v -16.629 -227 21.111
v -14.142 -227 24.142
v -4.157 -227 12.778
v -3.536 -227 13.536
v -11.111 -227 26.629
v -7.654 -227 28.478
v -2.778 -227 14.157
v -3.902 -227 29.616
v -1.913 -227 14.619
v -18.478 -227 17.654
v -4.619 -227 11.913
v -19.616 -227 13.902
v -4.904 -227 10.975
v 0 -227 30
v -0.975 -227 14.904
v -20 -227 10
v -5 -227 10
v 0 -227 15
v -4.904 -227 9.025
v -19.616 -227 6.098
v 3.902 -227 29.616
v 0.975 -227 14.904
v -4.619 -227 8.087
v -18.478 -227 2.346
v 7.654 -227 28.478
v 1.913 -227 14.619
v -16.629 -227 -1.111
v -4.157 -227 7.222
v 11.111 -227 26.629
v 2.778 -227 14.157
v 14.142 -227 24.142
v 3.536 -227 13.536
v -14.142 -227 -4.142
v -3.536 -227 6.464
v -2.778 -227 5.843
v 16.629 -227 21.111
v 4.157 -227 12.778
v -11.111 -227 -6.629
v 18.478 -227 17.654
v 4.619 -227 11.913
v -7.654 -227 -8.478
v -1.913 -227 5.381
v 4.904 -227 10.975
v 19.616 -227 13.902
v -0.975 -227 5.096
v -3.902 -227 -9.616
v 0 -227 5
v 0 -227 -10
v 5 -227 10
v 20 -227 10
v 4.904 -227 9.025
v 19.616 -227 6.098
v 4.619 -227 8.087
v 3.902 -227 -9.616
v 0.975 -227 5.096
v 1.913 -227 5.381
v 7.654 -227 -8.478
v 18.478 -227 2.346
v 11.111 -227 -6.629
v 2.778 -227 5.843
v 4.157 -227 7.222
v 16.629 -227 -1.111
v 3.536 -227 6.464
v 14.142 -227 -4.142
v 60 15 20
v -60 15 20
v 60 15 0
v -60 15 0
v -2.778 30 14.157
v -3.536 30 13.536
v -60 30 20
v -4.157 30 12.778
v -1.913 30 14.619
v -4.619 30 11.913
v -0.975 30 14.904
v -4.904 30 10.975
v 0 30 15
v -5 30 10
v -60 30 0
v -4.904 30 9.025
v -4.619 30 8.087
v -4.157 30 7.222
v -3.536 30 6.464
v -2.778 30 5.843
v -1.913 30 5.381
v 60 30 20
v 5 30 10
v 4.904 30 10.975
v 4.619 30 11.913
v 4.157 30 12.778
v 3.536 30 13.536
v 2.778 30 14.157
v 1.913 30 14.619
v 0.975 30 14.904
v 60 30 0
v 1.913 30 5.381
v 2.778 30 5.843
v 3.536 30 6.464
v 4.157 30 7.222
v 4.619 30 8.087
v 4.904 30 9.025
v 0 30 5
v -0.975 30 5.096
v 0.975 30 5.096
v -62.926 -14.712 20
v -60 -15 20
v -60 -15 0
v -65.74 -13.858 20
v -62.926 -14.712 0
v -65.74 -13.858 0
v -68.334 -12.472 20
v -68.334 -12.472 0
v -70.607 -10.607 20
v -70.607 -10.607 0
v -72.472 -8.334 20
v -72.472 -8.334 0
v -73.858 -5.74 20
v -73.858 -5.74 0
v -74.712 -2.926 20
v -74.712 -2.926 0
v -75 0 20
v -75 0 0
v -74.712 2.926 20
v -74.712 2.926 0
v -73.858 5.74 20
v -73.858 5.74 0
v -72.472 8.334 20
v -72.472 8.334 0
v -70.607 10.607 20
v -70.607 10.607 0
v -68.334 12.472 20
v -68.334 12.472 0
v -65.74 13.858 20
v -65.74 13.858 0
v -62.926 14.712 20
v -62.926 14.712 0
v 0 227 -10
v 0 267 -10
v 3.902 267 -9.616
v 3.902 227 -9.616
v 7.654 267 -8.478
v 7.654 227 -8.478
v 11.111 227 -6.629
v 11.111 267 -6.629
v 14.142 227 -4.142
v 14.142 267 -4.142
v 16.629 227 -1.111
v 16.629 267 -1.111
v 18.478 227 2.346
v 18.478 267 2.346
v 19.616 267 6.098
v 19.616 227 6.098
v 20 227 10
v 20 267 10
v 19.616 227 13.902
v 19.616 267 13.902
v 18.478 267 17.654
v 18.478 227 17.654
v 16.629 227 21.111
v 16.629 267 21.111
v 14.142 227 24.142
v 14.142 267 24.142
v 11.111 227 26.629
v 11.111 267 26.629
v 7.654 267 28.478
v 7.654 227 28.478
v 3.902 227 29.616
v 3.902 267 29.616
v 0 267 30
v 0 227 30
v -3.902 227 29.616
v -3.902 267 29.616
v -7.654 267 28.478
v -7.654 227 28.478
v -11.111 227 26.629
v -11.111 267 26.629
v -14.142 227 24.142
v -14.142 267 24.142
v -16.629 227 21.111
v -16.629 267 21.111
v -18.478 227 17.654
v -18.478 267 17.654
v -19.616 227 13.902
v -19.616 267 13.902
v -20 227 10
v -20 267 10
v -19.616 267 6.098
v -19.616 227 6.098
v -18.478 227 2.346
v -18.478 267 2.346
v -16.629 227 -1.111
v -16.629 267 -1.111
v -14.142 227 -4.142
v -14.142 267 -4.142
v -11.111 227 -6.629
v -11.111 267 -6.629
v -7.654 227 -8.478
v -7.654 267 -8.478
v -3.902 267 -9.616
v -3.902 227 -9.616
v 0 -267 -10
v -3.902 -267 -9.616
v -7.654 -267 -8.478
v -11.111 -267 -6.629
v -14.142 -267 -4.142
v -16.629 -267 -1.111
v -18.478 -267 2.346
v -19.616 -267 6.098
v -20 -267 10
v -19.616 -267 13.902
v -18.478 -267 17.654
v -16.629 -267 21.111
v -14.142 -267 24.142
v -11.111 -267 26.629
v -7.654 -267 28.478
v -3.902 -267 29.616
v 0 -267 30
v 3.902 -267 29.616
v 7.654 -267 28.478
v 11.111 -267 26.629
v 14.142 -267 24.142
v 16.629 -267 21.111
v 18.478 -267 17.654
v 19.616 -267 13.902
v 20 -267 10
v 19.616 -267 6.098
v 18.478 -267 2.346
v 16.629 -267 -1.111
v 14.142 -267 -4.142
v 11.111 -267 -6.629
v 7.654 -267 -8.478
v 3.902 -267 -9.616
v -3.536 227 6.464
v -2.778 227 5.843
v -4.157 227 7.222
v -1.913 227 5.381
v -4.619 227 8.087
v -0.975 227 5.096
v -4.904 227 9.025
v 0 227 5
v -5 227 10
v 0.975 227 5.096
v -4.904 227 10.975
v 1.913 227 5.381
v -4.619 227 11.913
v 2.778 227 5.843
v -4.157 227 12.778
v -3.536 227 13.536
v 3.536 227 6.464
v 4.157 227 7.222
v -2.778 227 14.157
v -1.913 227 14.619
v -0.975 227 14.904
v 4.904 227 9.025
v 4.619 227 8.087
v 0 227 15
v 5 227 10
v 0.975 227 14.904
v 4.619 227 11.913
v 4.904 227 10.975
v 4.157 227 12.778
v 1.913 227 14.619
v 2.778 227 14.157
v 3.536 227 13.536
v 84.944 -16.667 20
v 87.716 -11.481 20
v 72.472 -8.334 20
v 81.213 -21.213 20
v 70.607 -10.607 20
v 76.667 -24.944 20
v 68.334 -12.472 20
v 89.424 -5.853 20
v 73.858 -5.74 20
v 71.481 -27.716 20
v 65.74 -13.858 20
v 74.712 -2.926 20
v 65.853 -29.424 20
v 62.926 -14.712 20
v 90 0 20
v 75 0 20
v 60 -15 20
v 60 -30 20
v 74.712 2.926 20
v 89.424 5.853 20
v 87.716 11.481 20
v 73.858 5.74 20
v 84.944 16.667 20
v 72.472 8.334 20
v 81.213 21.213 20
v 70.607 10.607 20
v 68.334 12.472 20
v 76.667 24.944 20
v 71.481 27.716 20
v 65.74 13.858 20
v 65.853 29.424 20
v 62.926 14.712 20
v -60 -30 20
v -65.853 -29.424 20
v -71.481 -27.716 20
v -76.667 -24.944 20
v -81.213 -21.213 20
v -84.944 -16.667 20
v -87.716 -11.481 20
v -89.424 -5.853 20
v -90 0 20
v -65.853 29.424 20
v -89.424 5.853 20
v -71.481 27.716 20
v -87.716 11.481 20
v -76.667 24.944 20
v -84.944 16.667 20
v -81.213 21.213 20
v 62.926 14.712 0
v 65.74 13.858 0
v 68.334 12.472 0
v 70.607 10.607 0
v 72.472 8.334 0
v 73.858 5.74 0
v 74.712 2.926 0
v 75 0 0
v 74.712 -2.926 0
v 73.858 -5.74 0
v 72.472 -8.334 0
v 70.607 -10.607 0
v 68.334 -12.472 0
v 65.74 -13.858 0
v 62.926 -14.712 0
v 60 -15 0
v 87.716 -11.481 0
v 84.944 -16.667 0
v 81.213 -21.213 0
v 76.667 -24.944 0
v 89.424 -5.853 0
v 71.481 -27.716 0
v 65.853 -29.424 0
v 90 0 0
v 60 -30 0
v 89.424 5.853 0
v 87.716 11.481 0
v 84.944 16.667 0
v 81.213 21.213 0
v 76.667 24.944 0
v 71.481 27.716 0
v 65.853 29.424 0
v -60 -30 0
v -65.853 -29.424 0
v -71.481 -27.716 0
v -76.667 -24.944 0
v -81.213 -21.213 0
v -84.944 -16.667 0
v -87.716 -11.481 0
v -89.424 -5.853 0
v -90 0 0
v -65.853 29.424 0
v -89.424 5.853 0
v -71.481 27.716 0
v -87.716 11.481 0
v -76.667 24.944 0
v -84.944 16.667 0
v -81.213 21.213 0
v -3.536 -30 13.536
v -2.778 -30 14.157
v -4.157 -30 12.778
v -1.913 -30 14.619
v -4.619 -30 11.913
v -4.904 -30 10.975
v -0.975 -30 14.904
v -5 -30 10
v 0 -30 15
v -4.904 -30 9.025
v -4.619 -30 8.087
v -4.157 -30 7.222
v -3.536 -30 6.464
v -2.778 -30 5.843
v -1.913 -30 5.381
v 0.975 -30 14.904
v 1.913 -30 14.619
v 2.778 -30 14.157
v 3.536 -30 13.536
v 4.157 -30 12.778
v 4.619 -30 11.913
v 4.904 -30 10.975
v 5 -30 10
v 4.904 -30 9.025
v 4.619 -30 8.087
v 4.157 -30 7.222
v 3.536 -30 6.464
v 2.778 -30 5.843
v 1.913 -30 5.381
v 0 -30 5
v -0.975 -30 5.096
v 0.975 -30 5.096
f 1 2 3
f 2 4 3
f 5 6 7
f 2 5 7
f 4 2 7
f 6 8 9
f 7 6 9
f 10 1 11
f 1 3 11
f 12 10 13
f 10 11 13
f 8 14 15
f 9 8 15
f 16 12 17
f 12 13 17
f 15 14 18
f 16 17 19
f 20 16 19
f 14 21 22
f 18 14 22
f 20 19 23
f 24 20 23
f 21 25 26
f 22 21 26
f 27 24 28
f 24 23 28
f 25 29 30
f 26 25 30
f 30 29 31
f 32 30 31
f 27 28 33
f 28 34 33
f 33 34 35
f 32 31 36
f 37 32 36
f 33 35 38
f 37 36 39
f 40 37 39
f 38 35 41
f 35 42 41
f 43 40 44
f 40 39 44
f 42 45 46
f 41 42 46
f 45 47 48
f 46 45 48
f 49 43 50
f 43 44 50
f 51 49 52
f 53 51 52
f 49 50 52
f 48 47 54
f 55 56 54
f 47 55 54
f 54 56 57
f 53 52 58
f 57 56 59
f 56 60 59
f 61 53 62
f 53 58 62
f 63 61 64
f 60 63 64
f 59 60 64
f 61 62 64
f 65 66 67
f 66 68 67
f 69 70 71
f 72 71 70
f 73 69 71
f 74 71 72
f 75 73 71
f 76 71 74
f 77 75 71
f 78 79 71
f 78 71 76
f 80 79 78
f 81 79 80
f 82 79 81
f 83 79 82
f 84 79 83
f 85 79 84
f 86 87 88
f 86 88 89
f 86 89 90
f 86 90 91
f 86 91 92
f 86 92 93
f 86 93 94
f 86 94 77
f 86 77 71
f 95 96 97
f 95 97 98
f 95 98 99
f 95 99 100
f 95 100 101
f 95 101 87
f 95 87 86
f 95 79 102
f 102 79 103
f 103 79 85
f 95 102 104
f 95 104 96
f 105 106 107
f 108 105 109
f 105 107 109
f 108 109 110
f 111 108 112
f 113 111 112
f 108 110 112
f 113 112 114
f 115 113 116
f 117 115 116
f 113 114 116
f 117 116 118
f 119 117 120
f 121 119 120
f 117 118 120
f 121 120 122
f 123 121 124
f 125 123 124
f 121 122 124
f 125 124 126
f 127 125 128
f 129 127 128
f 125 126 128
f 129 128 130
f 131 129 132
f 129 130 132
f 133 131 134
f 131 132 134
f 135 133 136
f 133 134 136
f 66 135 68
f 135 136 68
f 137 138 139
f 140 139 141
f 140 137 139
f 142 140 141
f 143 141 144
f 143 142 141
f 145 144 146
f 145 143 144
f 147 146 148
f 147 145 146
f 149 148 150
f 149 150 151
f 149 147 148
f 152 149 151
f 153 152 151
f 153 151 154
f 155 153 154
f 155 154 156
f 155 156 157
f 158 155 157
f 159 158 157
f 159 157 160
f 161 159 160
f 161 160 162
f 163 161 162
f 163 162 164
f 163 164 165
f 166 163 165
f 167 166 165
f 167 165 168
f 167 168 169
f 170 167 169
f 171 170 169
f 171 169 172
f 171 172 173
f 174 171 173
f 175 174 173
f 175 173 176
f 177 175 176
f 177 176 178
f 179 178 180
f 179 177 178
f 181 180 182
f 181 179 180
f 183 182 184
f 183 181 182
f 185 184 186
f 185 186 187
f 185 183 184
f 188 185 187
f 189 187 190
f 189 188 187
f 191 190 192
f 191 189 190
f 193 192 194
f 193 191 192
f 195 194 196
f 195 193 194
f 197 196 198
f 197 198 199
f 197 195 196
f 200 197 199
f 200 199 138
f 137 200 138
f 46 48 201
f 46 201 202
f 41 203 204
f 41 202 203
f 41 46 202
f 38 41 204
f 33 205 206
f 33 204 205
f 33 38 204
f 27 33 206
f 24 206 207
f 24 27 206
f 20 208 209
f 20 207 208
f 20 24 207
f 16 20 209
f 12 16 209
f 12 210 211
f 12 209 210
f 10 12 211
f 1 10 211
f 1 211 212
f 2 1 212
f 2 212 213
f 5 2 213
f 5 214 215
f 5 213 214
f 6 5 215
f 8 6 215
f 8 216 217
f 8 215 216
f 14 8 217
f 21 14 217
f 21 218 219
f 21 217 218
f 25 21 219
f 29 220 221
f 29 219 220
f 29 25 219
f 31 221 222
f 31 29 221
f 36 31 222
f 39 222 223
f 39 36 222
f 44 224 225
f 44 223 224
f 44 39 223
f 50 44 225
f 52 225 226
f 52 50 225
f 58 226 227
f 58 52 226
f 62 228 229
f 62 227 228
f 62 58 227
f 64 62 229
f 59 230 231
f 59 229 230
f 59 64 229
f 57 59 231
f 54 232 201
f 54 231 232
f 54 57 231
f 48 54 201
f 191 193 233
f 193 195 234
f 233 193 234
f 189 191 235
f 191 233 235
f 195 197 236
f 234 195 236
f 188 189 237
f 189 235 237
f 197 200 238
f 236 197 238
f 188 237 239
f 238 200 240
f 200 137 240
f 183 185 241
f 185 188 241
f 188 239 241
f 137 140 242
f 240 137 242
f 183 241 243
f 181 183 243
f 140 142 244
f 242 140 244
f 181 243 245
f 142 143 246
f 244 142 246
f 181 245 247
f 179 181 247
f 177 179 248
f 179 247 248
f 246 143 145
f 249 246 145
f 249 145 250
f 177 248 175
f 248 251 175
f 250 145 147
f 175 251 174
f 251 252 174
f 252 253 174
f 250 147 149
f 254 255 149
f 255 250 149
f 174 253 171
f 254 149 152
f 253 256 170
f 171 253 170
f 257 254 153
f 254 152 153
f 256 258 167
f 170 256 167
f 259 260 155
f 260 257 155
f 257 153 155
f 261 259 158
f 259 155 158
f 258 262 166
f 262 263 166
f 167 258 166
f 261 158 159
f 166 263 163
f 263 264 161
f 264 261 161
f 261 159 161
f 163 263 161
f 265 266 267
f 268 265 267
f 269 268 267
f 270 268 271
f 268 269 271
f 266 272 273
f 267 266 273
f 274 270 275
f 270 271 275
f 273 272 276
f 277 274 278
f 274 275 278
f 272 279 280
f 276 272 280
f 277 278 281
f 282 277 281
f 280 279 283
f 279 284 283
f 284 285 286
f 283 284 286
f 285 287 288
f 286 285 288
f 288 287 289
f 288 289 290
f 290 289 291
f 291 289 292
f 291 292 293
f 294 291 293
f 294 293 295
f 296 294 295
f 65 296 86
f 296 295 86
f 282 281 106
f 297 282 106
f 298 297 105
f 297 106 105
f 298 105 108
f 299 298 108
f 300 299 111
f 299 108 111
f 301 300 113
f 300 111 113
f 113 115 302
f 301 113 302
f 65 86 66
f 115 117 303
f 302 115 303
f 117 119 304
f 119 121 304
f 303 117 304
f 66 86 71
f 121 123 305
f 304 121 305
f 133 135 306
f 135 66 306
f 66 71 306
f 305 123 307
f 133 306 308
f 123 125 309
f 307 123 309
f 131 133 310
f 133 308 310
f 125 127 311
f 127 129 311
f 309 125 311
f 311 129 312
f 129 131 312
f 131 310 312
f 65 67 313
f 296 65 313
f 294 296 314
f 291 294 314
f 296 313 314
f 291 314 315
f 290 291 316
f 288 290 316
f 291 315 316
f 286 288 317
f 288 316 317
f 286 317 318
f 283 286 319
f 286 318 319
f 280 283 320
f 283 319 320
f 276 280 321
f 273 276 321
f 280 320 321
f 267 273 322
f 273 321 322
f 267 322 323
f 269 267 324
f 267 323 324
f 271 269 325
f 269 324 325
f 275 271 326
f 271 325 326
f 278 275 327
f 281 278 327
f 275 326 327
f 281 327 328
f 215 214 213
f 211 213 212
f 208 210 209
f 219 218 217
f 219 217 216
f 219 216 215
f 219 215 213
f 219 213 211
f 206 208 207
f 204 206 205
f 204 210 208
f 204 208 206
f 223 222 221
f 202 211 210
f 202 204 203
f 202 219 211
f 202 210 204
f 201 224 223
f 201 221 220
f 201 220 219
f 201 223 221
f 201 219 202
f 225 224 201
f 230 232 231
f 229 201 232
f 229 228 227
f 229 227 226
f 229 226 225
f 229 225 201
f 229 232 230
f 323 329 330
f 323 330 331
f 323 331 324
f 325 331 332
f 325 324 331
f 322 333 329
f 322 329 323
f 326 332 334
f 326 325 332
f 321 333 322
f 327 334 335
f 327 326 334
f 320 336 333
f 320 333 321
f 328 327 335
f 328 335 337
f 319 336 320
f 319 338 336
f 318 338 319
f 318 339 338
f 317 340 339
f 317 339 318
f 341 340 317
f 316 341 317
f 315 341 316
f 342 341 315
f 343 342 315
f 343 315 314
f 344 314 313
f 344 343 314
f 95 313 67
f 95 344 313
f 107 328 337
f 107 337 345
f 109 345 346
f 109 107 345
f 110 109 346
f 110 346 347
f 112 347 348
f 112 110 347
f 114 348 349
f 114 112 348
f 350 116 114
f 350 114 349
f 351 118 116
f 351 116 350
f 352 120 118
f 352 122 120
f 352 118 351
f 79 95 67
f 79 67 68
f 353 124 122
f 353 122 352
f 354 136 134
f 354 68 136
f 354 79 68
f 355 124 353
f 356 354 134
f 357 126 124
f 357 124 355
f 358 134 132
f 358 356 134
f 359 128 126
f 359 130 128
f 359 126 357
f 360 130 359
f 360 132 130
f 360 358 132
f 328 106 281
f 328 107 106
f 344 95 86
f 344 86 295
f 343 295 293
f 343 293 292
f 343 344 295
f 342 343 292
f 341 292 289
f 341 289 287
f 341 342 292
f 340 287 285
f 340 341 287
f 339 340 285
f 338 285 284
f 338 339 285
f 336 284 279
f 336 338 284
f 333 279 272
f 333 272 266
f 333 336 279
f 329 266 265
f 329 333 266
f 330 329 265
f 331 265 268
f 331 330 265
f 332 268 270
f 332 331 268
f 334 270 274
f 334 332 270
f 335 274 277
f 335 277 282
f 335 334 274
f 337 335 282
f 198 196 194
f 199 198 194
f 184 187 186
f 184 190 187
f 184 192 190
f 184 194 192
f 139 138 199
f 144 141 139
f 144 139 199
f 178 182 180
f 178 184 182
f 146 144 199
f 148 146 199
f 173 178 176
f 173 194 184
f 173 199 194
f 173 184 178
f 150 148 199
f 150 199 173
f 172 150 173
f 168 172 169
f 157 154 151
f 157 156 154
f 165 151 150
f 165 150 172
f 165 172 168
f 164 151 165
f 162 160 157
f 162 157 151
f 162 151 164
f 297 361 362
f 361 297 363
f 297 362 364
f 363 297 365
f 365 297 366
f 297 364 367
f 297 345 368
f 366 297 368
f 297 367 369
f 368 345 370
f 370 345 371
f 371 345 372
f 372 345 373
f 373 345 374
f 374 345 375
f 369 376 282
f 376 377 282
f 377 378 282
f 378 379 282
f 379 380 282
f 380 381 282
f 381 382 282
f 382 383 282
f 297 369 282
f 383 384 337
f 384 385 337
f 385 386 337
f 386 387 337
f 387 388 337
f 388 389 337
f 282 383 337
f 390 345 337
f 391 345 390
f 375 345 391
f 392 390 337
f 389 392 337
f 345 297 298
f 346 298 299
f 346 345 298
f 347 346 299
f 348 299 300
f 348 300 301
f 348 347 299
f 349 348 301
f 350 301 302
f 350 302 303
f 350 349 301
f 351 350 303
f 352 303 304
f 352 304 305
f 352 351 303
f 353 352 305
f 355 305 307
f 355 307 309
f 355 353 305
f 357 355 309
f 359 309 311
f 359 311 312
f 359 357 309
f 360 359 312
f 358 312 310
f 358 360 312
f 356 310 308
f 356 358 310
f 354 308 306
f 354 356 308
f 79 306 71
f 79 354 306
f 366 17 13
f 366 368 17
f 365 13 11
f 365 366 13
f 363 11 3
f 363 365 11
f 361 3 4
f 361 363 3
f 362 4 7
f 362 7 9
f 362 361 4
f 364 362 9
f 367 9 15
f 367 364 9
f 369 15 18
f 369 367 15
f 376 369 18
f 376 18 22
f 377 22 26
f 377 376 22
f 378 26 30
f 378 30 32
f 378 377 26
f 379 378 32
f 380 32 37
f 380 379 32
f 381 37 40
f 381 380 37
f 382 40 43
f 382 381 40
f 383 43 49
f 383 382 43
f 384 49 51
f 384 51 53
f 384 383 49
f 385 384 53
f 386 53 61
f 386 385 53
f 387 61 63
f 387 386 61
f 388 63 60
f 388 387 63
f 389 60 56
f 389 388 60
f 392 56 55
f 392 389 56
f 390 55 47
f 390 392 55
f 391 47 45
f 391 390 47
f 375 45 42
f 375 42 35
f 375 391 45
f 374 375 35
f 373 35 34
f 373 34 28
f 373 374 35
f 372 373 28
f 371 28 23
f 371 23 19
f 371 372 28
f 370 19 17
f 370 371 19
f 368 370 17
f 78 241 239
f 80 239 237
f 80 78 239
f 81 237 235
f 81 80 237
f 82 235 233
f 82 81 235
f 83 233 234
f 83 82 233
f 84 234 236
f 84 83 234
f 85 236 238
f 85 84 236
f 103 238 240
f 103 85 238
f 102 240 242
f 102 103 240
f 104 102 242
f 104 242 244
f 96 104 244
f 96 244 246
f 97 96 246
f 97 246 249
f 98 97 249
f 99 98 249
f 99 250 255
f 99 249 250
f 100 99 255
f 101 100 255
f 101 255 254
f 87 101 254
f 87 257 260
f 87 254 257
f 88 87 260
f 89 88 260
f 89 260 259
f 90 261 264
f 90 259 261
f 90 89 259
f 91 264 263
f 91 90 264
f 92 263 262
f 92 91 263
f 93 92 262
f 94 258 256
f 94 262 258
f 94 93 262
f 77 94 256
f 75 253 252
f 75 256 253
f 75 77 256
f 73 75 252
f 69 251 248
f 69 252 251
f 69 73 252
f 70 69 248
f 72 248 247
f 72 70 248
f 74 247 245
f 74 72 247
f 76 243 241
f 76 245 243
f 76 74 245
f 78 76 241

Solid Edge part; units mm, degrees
sketch "Sketch1" plane through (0, 0, 0) normal (0, 0, 1) x (1, 0, 0)
  arc A0 (60, 30) -> (60, -30) centre (60, 0) cw
  line L0 (0, -30) -> (60, -30)
  line L1 (-60, -30) -> (0, -30)
  arc A1 (-60, -30) -> (-60, 30) centre (-60, 0) cw
  line L2 (-60, 30) -> (0, 30)
  line L3 (0, 30) -> (60, 30)
  arc A2 (60, 15) -> (60, -15) centre (60, 0) cw
  line L4 (0, -15) -> (60, -15)
  line L5 (-60, -15) -> (0, -15)
  arc A3 (-60, -15) -> (-60, 15) centre (-60, 0) cw
  line L6 (-60, 15) -> (0, 15)
  line L7 (0, 15) -> (60, 15)
extrude "ExtrudedProtrusion_1" add sketch "Sketch1" along normal blind 20
sketch "Sketch2" plane through (0, 30, 10) normal (0, 1, 0) x (-1, 0, 0)
  circle A0 centre (0, 0) radius 5
extrude "ExtrudedProtrusion_2" add sketch "Sketch2" along normal blind 197
mirror "Mirror1" about plane through (0, 0, 10) normal (0, 1, 0) of "ExtrudedProtrusion_2"
sketch "Sketch3" plane through (0, -227, 10) normal (0, -1, 0) x (0, 0, -1)
  circle A0 centre (0, 0) radius 20
extrude "ExtrudedProtrusion_3" add sketch "Sketch3" along normal blind 40
mirror "Mirror2" about plane through (0, 0, 0) normal (0, -1, 0) of "ExtrudedProtrusion_3"
